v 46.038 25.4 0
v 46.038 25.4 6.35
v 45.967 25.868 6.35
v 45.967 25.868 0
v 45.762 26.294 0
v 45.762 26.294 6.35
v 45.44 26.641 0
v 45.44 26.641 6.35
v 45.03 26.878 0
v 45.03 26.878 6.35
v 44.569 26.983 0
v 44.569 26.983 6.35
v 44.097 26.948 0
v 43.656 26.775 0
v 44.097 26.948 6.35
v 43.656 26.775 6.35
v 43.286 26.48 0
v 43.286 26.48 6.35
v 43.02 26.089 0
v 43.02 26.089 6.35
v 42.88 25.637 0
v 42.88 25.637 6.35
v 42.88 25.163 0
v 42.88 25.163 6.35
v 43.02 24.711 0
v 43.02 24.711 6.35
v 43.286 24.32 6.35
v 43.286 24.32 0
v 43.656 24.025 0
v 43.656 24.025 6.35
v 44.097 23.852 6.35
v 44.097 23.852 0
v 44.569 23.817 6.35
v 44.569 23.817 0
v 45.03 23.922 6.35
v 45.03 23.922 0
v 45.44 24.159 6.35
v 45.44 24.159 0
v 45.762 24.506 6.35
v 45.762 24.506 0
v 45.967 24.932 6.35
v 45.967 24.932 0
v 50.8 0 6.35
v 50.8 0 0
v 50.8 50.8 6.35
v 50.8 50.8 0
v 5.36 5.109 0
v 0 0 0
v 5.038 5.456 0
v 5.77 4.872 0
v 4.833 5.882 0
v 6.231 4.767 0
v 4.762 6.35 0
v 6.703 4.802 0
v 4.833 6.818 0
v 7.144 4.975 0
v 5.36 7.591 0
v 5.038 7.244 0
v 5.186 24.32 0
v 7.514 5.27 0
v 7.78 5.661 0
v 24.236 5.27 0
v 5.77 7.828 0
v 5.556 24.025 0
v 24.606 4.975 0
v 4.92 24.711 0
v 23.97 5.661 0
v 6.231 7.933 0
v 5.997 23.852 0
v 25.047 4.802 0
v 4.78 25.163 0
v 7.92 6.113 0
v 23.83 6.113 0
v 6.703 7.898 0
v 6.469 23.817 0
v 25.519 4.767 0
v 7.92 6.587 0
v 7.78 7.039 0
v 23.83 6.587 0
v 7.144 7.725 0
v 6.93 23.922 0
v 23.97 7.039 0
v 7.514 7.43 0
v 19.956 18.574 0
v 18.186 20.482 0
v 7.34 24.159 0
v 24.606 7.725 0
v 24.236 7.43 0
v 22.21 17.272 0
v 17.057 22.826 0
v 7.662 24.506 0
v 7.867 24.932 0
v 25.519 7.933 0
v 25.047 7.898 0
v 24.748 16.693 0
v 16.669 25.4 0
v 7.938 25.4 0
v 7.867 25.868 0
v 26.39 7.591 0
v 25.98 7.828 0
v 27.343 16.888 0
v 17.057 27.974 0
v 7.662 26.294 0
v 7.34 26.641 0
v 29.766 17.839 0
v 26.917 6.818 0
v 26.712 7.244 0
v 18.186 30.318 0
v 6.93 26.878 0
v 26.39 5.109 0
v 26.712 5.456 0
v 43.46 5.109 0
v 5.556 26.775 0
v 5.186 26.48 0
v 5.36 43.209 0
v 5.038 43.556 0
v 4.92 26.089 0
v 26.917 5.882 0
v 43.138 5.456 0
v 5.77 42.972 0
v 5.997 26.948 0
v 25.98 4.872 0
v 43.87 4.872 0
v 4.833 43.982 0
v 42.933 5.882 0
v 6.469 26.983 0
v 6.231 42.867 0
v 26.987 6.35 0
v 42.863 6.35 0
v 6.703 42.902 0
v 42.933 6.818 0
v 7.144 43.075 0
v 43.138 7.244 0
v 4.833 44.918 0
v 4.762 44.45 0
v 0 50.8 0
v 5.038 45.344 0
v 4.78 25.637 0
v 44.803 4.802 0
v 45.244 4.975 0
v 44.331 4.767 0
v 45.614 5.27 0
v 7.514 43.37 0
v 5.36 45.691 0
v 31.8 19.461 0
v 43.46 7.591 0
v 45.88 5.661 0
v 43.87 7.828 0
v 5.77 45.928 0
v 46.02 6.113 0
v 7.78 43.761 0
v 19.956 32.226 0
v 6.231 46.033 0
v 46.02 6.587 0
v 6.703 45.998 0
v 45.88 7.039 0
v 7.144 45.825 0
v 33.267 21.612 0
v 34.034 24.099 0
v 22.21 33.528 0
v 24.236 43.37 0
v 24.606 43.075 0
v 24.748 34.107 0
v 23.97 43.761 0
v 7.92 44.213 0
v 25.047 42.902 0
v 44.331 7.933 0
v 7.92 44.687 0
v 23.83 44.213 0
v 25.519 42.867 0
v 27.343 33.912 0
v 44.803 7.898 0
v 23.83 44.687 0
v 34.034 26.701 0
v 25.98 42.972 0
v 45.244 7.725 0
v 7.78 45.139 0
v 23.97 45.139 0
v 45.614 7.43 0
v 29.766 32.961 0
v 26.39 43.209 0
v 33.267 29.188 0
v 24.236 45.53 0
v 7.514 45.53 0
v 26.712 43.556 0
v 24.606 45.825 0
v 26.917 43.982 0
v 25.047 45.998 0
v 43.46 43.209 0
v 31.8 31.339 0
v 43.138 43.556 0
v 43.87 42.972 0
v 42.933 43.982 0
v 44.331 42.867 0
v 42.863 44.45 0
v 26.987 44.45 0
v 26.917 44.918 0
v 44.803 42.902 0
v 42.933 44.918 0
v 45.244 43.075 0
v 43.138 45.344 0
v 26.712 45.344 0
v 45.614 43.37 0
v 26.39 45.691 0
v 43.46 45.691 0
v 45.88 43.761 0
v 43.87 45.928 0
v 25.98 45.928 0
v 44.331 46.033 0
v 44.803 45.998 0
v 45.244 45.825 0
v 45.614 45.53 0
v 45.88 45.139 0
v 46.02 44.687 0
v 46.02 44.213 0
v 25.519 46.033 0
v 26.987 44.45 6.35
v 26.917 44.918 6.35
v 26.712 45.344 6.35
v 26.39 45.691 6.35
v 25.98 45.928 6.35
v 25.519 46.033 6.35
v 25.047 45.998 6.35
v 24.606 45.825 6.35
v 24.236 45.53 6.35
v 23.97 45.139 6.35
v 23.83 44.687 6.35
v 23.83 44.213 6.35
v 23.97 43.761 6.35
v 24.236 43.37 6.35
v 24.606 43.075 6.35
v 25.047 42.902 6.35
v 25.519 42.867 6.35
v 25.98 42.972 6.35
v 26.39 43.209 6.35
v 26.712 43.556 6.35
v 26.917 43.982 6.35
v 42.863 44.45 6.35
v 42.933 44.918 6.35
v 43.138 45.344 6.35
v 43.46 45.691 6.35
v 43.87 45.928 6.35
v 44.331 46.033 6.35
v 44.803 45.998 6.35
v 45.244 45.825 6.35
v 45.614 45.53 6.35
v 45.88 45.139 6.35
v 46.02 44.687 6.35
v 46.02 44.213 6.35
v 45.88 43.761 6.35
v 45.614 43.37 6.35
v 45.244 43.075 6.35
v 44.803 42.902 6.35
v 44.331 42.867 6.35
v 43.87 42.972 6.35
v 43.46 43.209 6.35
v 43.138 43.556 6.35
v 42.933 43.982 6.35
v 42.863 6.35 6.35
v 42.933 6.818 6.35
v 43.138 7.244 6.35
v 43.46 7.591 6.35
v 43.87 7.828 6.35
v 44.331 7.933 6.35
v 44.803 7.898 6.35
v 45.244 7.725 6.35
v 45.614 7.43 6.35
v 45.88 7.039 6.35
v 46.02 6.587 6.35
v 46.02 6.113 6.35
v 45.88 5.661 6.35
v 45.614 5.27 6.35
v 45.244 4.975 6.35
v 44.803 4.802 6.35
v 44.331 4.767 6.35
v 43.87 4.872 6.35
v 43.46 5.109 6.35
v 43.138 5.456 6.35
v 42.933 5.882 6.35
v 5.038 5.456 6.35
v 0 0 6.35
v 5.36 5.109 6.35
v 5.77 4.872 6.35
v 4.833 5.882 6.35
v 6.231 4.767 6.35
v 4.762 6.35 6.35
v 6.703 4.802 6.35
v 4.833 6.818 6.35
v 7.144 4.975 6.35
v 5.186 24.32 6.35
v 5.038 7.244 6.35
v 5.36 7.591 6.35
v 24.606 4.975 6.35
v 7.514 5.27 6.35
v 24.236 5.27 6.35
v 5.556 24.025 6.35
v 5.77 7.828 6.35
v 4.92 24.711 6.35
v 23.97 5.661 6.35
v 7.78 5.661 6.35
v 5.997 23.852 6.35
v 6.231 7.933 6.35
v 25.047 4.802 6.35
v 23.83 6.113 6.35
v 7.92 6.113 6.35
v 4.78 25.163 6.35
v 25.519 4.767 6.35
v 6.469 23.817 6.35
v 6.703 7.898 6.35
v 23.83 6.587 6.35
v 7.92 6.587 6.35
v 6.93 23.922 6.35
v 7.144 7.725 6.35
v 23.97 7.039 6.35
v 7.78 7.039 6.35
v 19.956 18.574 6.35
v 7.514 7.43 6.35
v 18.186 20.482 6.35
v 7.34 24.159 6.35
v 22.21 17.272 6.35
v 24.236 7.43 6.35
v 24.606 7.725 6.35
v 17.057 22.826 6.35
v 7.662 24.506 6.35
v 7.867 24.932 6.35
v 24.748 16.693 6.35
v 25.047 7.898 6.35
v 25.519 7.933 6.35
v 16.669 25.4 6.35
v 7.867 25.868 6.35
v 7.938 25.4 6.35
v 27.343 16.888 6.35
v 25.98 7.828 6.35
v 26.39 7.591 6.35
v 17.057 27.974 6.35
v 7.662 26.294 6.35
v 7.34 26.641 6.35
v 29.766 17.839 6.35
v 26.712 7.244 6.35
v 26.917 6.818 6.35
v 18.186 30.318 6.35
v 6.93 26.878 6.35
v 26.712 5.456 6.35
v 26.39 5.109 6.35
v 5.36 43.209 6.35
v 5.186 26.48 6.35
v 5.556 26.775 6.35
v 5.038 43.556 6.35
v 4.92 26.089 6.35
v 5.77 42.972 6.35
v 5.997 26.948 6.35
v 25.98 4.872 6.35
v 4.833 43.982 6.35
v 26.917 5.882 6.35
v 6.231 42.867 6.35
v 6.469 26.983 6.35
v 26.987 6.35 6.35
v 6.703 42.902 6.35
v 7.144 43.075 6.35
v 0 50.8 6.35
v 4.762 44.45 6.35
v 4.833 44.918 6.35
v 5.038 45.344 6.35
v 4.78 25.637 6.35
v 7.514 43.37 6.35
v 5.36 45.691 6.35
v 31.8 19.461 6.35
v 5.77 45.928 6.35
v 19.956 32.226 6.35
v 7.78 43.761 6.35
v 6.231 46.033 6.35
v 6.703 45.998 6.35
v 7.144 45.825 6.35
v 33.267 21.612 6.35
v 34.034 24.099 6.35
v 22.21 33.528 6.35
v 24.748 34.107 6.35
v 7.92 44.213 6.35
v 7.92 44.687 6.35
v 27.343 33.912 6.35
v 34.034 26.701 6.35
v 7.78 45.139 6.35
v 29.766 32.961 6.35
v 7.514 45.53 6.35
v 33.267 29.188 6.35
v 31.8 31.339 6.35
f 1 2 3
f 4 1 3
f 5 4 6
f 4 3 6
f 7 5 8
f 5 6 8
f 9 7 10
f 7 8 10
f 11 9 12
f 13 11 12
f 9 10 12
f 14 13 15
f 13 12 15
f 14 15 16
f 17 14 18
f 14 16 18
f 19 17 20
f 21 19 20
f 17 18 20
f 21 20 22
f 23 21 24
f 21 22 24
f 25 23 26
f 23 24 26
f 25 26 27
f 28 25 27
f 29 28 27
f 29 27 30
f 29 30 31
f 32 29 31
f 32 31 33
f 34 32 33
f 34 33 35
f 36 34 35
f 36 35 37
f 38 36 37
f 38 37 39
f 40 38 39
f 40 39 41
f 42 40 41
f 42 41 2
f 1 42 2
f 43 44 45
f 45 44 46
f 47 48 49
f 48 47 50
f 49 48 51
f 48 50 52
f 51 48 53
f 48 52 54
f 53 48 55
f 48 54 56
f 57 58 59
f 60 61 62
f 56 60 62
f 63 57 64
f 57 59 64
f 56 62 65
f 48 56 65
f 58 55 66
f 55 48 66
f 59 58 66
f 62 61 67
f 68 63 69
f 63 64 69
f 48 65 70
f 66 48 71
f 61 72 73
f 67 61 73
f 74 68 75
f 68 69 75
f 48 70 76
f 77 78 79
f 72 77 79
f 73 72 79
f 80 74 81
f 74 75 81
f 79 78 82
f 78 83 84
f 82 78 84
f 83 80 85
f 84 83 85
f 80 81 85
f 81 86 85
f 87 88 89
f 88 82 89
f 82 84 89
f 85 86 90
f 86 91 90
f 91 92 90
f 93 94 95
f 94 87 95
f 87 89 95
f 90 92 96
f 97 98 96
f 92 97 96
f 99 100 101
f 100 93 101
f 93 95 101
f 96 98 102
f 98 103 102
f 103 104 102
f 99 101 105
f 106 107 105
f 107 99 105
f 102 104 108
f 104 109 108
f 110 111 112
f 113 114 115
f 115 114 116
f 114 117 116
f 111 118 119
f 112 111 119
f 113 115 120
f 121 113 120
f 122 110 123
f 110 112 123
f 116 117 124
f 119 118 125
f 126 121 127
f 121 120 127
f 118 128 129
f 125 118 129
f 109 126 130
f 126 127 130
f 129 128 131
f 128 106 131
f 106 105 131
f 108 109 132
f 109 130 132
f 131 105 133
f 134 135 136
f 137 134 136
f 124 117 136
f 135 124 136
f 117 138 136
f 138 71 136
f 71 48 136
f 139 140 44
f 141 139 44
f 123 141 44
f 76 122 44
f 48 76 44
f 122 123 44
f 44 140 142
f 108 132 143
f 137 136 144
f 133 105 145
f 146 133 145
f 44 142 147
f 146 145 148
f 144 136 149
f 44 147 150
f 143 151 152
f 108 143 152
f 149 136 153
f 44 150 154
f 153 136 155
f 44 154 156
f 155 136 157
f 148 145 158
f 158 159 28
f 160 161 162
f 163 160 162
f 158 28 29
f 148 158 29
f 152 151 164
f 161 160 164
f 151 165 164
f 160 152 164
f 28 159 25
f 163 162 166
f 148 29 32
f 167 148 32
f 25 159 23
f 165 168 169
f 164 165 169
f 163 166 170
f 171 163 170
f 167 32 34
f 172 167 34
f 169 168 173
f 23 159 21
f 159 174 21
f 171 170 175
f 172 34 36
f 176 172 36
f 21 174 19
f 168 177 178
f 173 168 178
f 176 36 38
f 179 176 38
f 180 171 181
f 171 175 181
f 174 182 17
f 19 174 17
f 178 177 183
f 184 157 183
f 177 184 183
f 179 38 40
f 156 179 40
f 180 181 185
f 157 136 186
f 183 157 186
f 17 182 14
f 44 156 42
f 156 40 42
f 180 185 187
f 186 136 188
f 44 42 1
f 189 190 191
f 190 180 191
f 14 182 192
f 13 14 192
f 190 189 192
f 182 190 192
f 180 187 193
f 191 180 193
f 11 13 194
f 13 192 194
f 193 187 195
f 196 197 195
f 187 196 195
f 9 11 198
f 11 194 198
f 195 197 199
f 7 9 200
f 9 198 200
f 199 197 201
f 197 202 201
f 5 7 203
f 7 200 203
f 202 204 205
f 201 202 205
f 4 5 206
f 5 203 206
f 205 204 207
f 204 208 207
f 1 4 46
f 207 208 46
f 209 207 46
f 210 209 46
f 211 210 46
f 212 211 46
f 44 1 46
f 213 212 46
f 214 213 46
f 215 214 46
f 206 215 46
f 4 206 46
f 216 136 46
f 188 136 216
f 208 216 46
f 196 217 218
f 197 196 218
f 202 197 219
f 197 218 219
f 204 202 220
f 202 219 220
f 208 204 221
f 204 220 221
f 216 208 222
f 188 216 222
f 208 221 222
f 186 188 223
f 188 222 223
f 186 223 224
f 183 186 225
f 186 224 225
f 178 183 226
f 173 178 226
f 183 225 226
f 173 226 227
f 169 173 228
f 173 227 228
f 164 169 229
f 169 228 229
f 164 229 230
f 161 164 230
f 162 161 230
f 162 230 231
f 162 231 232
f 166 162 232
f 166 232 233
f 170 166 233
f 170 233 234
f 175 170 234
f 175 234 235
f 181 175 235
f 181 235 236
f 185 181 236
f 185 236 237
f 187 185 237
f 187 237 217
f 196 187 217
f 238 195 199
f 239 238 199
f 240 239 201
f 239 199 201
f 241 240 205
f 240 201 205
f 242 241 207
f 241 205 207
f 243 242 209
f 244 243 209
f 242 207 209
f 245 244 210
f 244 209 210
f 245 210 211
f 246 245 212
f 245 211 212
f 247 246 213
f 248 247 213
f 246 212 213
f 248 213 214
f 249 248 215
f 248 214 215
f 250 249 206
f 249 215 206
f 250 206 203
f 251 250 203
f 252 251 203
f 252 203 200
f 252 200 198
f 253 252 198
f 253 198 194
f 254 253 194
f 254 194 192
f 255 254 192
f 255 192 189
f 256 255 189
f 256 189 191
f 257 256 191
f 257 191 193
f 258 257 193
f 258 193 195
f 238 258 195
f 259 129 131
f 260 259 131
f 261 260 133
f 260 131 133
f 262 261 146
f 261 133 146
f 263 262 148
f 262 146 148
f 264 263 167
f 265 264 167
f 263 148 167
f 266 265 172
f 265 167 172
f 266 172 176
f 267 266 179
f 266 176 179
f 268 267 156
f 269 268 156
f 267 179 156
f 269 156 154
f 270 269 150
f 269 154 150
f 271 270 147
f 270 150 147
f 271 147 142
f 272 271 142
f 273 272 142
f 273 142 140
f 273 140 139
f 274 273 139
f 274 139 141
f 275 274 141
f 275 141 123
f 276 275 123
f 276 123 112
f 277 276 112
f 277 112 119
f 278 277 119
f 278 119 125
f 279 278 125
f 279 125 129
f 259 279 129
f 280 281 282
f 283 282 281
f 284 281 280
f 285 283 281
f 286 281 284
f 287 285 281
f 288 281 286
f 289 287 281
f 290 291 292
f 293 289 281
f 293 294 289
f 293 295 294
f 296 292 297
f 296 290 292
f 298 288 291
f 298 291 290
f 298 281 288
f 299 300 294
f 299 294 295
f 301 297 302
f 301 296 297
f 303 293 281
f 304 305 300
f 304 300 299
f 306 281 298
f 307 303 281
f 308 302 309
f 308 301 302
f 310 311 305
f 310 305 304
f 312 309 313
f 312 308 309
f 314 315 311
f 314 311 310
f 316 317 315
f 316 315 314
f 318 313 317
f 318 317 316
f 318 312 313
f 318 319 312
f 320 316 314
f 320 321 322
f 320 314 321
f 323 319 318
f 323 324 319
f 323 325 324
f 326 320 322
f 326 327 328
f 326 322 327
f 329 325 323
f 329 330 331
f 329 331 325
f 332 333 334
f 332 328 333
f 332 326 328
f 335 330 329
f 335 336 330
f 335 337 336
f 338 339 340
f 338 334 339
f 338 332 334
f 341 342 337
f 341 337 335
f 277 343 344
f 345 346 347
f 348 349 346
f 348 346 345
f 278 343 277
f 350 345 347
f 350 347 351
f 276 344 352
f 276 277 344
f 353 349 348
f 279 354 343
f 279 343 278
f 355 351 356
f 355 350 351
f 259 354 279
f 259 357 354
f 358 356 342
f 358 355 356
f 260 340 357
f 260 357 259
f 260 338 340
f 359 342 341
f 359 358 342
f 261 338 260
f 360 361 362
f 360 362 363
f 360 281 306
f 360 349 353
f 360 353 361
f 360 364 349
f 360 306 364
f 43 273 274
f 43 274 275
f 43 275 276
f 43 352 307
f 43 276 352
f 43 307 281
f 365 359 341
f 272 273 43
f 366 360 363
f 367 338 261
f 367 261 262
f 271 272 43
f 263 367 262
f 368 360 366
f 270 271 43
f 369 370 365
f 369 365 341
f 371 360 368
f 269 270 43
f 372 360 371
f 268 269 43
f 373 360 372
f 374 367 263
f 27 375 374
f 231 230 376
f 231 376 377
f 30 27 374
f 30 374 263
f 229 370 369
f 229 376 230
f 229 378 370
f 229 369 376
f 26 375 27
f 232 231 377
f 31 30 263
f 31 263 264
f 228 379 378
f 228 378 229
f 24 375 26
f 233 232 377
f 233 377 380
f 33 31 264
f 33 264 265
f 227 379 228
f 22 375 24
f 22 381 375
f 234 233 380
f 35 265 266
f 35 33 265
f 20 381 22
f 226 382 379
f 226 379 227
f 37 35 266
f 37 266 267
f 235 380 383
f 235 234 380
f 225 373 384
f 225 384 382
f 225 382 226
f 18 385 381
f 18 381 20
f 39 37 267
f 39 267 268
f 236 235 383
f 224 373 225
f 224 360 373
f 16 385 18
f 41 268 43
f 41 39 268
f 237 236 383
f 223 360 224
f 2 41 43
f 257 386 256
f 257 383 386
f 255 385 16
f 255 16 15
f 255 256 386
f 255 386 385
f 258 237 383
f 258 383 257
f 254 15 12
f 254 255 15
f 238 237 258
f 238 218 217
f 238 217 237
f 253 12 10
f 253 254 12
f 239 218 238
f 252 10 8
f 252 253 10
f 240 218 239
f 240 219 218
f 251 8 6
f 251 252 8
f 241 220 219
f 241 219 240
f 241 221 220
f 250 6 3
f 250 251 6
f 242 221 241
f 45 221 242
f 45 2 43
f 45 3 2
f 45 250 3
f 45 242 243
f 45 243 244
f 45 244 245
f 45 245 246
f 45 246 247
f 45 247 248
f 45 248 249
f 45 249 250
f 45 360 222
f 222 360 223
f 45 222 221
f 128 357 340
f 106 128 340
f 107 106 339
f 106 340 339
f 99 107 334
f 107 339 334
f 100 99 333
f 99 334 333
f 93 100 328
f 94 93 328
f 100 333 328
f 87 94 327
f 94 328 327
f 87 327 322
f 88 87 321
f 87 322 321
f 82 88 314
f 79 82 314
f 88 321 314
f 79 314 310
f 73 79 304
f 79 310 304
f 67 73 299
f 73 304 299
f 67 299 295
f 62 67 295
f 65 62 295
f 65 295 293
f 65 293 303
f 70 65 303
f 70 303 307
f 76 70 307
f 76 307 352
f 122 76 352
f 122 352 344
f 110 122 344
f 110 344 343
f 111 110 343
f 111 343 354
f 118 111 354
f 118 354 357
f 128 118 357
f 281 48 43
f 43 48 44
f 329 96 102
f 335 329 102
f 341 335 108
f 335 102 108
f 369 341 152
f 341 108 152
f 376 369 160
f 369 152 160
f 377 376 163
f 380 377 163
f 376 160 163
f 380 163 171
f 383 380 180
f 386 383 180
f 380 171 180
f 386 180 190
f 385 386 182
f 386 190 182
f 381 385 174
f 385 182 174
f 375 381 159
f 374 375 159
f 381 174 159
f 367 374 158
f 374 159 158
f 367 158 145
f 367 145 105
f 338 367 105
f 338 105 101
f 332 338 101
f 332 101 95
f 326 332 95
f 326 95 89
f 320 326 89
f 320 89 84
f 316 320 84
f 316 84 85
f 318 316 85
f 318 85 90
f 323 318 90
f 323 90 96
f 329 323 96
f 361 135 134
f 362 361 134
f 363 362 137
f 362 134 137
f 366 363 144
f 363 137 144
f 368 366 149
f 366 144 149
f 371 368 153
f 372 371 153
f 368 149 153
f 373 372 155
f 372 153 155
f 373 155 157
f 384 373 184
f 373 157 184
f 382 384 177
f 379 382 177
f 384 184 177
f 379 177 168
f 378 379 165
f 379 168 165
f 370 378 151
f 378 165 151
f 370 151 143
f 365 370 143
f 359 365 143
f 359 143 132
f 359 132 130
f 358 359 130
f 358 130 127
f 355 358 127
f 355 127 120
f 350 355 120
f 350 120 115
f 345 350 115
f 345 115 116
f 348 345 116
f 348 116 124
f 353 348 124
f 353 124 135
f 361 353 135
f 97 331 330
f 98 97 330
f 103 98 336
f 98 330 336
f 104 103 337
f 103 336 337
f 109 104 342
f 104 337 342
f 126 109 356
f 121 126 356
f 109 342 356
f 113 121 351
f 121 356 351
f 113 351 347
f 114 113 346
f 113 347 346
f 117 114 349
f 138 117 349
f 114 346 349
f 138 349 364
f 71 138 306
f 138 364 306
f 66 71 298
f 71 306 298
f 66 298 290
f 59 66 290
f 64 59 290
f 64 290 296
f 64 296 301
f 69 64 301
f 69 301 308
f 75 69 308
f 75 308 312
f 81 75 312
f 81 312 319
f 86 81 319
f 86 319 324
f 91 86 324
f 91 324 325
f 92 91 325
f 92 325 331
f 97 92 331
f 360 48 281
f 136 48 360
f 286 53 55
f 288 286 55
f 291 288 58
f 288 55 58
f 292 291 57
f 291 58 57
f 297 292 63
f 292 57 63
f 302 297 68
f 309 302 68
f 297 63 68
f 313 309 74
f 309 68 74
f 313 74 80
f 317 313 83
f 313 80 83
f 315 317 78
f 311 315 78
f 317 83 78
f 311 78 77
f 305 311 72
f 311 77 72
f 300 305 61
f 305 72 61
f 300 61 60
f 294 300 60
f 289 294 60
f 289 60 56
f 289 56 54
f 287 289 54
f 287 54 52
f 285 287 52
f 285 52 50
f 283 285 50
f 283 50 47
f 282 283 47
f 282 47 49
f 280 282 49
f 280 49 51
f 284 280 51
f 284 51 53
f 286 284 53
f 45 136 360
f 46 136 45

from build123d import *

# Parameters (mm, degrees)
SKETCH1_W           = 50.8
SKETCH1_H           = 50.8
BOSS_EXTRUDE1_DEPTH = 6.35
SKETCH2_R           = 8.73125
CUT_EXTRUDE7_DEPTH  = 7.35
SKETCH5_R           = 1.5875
CUT_EXTRUDE8_DEPTH  = 7.35
SKETCH7_R           = 1.5875
CUT_EXTRUDE9_DEPTH  = 7.35


with BuildPart() as part:
    # Sketch1 → Boss-Extrude1 (new body)
    with BuildSketch(Plane.XY):
        with Locations((25.4, 25.4)):
            Rectangle(SKETCH1_W, SKETCH1_H)
    extrude(amount=BOSS_EXTRUDE1_DEPTH)

    # Sketch2 → Cut-Extrude7 (cut, through all)
    with BuildSketch(Plane(origin=(0, 0, 0), x_dir=(-1, 0, 0), z_dir=(0, 0, -1))):
        with Locations((-25.4, 25.4)):
            Circle(SKETCH2_R)
    extrude(amount=-CUT_EXTRUDE7_DEPTH, mode=Mode.SUBTRACT)

    # Sketch5 → Cut-Extrude8 (cut, through all)
    with BuildSketch(Plane.XY.offset(6.35)):
        with Locations((25.4, 6.35)):
            Circle(SKETCH5_R)
        with Locations((6.35, 25.4)):
            Circle(SKETCH5_R)
        with Locations((25.4, 44.45)):
            Circle(SKETCH5_R)
        with Locations((44.45, 25.4)):
            Circle(SKETCH5_R)
    extrude(amount=-CUT_EXTRUDE8_DEPTH, mode=Mode.SUBTRACT)

    # Sketch7 → Cut-Extrude9 (cut, through all)
    with BuildSketch(Plane(origin=(0, 0, 0), x_dir=(-1, 0, 0), z_dir=(0, 0, -1))):
        with Locations((-6.35, 6.35)):
            Circle(SKETCH7_R)
        with Locations((-44.45, 6.35)):
            Circle(SKETCH7_R)
        with Locations((-44.45, 44.45)):
            Circle(SKETCH7_R)
        with Locations((-6.35, 44.45)):
            Circle(SKETCH7_R)
    extrude(amount=-CUT_EXTRUDE9_DEPTH, mode=Mode.SUBTRACT)


solid = part.part
